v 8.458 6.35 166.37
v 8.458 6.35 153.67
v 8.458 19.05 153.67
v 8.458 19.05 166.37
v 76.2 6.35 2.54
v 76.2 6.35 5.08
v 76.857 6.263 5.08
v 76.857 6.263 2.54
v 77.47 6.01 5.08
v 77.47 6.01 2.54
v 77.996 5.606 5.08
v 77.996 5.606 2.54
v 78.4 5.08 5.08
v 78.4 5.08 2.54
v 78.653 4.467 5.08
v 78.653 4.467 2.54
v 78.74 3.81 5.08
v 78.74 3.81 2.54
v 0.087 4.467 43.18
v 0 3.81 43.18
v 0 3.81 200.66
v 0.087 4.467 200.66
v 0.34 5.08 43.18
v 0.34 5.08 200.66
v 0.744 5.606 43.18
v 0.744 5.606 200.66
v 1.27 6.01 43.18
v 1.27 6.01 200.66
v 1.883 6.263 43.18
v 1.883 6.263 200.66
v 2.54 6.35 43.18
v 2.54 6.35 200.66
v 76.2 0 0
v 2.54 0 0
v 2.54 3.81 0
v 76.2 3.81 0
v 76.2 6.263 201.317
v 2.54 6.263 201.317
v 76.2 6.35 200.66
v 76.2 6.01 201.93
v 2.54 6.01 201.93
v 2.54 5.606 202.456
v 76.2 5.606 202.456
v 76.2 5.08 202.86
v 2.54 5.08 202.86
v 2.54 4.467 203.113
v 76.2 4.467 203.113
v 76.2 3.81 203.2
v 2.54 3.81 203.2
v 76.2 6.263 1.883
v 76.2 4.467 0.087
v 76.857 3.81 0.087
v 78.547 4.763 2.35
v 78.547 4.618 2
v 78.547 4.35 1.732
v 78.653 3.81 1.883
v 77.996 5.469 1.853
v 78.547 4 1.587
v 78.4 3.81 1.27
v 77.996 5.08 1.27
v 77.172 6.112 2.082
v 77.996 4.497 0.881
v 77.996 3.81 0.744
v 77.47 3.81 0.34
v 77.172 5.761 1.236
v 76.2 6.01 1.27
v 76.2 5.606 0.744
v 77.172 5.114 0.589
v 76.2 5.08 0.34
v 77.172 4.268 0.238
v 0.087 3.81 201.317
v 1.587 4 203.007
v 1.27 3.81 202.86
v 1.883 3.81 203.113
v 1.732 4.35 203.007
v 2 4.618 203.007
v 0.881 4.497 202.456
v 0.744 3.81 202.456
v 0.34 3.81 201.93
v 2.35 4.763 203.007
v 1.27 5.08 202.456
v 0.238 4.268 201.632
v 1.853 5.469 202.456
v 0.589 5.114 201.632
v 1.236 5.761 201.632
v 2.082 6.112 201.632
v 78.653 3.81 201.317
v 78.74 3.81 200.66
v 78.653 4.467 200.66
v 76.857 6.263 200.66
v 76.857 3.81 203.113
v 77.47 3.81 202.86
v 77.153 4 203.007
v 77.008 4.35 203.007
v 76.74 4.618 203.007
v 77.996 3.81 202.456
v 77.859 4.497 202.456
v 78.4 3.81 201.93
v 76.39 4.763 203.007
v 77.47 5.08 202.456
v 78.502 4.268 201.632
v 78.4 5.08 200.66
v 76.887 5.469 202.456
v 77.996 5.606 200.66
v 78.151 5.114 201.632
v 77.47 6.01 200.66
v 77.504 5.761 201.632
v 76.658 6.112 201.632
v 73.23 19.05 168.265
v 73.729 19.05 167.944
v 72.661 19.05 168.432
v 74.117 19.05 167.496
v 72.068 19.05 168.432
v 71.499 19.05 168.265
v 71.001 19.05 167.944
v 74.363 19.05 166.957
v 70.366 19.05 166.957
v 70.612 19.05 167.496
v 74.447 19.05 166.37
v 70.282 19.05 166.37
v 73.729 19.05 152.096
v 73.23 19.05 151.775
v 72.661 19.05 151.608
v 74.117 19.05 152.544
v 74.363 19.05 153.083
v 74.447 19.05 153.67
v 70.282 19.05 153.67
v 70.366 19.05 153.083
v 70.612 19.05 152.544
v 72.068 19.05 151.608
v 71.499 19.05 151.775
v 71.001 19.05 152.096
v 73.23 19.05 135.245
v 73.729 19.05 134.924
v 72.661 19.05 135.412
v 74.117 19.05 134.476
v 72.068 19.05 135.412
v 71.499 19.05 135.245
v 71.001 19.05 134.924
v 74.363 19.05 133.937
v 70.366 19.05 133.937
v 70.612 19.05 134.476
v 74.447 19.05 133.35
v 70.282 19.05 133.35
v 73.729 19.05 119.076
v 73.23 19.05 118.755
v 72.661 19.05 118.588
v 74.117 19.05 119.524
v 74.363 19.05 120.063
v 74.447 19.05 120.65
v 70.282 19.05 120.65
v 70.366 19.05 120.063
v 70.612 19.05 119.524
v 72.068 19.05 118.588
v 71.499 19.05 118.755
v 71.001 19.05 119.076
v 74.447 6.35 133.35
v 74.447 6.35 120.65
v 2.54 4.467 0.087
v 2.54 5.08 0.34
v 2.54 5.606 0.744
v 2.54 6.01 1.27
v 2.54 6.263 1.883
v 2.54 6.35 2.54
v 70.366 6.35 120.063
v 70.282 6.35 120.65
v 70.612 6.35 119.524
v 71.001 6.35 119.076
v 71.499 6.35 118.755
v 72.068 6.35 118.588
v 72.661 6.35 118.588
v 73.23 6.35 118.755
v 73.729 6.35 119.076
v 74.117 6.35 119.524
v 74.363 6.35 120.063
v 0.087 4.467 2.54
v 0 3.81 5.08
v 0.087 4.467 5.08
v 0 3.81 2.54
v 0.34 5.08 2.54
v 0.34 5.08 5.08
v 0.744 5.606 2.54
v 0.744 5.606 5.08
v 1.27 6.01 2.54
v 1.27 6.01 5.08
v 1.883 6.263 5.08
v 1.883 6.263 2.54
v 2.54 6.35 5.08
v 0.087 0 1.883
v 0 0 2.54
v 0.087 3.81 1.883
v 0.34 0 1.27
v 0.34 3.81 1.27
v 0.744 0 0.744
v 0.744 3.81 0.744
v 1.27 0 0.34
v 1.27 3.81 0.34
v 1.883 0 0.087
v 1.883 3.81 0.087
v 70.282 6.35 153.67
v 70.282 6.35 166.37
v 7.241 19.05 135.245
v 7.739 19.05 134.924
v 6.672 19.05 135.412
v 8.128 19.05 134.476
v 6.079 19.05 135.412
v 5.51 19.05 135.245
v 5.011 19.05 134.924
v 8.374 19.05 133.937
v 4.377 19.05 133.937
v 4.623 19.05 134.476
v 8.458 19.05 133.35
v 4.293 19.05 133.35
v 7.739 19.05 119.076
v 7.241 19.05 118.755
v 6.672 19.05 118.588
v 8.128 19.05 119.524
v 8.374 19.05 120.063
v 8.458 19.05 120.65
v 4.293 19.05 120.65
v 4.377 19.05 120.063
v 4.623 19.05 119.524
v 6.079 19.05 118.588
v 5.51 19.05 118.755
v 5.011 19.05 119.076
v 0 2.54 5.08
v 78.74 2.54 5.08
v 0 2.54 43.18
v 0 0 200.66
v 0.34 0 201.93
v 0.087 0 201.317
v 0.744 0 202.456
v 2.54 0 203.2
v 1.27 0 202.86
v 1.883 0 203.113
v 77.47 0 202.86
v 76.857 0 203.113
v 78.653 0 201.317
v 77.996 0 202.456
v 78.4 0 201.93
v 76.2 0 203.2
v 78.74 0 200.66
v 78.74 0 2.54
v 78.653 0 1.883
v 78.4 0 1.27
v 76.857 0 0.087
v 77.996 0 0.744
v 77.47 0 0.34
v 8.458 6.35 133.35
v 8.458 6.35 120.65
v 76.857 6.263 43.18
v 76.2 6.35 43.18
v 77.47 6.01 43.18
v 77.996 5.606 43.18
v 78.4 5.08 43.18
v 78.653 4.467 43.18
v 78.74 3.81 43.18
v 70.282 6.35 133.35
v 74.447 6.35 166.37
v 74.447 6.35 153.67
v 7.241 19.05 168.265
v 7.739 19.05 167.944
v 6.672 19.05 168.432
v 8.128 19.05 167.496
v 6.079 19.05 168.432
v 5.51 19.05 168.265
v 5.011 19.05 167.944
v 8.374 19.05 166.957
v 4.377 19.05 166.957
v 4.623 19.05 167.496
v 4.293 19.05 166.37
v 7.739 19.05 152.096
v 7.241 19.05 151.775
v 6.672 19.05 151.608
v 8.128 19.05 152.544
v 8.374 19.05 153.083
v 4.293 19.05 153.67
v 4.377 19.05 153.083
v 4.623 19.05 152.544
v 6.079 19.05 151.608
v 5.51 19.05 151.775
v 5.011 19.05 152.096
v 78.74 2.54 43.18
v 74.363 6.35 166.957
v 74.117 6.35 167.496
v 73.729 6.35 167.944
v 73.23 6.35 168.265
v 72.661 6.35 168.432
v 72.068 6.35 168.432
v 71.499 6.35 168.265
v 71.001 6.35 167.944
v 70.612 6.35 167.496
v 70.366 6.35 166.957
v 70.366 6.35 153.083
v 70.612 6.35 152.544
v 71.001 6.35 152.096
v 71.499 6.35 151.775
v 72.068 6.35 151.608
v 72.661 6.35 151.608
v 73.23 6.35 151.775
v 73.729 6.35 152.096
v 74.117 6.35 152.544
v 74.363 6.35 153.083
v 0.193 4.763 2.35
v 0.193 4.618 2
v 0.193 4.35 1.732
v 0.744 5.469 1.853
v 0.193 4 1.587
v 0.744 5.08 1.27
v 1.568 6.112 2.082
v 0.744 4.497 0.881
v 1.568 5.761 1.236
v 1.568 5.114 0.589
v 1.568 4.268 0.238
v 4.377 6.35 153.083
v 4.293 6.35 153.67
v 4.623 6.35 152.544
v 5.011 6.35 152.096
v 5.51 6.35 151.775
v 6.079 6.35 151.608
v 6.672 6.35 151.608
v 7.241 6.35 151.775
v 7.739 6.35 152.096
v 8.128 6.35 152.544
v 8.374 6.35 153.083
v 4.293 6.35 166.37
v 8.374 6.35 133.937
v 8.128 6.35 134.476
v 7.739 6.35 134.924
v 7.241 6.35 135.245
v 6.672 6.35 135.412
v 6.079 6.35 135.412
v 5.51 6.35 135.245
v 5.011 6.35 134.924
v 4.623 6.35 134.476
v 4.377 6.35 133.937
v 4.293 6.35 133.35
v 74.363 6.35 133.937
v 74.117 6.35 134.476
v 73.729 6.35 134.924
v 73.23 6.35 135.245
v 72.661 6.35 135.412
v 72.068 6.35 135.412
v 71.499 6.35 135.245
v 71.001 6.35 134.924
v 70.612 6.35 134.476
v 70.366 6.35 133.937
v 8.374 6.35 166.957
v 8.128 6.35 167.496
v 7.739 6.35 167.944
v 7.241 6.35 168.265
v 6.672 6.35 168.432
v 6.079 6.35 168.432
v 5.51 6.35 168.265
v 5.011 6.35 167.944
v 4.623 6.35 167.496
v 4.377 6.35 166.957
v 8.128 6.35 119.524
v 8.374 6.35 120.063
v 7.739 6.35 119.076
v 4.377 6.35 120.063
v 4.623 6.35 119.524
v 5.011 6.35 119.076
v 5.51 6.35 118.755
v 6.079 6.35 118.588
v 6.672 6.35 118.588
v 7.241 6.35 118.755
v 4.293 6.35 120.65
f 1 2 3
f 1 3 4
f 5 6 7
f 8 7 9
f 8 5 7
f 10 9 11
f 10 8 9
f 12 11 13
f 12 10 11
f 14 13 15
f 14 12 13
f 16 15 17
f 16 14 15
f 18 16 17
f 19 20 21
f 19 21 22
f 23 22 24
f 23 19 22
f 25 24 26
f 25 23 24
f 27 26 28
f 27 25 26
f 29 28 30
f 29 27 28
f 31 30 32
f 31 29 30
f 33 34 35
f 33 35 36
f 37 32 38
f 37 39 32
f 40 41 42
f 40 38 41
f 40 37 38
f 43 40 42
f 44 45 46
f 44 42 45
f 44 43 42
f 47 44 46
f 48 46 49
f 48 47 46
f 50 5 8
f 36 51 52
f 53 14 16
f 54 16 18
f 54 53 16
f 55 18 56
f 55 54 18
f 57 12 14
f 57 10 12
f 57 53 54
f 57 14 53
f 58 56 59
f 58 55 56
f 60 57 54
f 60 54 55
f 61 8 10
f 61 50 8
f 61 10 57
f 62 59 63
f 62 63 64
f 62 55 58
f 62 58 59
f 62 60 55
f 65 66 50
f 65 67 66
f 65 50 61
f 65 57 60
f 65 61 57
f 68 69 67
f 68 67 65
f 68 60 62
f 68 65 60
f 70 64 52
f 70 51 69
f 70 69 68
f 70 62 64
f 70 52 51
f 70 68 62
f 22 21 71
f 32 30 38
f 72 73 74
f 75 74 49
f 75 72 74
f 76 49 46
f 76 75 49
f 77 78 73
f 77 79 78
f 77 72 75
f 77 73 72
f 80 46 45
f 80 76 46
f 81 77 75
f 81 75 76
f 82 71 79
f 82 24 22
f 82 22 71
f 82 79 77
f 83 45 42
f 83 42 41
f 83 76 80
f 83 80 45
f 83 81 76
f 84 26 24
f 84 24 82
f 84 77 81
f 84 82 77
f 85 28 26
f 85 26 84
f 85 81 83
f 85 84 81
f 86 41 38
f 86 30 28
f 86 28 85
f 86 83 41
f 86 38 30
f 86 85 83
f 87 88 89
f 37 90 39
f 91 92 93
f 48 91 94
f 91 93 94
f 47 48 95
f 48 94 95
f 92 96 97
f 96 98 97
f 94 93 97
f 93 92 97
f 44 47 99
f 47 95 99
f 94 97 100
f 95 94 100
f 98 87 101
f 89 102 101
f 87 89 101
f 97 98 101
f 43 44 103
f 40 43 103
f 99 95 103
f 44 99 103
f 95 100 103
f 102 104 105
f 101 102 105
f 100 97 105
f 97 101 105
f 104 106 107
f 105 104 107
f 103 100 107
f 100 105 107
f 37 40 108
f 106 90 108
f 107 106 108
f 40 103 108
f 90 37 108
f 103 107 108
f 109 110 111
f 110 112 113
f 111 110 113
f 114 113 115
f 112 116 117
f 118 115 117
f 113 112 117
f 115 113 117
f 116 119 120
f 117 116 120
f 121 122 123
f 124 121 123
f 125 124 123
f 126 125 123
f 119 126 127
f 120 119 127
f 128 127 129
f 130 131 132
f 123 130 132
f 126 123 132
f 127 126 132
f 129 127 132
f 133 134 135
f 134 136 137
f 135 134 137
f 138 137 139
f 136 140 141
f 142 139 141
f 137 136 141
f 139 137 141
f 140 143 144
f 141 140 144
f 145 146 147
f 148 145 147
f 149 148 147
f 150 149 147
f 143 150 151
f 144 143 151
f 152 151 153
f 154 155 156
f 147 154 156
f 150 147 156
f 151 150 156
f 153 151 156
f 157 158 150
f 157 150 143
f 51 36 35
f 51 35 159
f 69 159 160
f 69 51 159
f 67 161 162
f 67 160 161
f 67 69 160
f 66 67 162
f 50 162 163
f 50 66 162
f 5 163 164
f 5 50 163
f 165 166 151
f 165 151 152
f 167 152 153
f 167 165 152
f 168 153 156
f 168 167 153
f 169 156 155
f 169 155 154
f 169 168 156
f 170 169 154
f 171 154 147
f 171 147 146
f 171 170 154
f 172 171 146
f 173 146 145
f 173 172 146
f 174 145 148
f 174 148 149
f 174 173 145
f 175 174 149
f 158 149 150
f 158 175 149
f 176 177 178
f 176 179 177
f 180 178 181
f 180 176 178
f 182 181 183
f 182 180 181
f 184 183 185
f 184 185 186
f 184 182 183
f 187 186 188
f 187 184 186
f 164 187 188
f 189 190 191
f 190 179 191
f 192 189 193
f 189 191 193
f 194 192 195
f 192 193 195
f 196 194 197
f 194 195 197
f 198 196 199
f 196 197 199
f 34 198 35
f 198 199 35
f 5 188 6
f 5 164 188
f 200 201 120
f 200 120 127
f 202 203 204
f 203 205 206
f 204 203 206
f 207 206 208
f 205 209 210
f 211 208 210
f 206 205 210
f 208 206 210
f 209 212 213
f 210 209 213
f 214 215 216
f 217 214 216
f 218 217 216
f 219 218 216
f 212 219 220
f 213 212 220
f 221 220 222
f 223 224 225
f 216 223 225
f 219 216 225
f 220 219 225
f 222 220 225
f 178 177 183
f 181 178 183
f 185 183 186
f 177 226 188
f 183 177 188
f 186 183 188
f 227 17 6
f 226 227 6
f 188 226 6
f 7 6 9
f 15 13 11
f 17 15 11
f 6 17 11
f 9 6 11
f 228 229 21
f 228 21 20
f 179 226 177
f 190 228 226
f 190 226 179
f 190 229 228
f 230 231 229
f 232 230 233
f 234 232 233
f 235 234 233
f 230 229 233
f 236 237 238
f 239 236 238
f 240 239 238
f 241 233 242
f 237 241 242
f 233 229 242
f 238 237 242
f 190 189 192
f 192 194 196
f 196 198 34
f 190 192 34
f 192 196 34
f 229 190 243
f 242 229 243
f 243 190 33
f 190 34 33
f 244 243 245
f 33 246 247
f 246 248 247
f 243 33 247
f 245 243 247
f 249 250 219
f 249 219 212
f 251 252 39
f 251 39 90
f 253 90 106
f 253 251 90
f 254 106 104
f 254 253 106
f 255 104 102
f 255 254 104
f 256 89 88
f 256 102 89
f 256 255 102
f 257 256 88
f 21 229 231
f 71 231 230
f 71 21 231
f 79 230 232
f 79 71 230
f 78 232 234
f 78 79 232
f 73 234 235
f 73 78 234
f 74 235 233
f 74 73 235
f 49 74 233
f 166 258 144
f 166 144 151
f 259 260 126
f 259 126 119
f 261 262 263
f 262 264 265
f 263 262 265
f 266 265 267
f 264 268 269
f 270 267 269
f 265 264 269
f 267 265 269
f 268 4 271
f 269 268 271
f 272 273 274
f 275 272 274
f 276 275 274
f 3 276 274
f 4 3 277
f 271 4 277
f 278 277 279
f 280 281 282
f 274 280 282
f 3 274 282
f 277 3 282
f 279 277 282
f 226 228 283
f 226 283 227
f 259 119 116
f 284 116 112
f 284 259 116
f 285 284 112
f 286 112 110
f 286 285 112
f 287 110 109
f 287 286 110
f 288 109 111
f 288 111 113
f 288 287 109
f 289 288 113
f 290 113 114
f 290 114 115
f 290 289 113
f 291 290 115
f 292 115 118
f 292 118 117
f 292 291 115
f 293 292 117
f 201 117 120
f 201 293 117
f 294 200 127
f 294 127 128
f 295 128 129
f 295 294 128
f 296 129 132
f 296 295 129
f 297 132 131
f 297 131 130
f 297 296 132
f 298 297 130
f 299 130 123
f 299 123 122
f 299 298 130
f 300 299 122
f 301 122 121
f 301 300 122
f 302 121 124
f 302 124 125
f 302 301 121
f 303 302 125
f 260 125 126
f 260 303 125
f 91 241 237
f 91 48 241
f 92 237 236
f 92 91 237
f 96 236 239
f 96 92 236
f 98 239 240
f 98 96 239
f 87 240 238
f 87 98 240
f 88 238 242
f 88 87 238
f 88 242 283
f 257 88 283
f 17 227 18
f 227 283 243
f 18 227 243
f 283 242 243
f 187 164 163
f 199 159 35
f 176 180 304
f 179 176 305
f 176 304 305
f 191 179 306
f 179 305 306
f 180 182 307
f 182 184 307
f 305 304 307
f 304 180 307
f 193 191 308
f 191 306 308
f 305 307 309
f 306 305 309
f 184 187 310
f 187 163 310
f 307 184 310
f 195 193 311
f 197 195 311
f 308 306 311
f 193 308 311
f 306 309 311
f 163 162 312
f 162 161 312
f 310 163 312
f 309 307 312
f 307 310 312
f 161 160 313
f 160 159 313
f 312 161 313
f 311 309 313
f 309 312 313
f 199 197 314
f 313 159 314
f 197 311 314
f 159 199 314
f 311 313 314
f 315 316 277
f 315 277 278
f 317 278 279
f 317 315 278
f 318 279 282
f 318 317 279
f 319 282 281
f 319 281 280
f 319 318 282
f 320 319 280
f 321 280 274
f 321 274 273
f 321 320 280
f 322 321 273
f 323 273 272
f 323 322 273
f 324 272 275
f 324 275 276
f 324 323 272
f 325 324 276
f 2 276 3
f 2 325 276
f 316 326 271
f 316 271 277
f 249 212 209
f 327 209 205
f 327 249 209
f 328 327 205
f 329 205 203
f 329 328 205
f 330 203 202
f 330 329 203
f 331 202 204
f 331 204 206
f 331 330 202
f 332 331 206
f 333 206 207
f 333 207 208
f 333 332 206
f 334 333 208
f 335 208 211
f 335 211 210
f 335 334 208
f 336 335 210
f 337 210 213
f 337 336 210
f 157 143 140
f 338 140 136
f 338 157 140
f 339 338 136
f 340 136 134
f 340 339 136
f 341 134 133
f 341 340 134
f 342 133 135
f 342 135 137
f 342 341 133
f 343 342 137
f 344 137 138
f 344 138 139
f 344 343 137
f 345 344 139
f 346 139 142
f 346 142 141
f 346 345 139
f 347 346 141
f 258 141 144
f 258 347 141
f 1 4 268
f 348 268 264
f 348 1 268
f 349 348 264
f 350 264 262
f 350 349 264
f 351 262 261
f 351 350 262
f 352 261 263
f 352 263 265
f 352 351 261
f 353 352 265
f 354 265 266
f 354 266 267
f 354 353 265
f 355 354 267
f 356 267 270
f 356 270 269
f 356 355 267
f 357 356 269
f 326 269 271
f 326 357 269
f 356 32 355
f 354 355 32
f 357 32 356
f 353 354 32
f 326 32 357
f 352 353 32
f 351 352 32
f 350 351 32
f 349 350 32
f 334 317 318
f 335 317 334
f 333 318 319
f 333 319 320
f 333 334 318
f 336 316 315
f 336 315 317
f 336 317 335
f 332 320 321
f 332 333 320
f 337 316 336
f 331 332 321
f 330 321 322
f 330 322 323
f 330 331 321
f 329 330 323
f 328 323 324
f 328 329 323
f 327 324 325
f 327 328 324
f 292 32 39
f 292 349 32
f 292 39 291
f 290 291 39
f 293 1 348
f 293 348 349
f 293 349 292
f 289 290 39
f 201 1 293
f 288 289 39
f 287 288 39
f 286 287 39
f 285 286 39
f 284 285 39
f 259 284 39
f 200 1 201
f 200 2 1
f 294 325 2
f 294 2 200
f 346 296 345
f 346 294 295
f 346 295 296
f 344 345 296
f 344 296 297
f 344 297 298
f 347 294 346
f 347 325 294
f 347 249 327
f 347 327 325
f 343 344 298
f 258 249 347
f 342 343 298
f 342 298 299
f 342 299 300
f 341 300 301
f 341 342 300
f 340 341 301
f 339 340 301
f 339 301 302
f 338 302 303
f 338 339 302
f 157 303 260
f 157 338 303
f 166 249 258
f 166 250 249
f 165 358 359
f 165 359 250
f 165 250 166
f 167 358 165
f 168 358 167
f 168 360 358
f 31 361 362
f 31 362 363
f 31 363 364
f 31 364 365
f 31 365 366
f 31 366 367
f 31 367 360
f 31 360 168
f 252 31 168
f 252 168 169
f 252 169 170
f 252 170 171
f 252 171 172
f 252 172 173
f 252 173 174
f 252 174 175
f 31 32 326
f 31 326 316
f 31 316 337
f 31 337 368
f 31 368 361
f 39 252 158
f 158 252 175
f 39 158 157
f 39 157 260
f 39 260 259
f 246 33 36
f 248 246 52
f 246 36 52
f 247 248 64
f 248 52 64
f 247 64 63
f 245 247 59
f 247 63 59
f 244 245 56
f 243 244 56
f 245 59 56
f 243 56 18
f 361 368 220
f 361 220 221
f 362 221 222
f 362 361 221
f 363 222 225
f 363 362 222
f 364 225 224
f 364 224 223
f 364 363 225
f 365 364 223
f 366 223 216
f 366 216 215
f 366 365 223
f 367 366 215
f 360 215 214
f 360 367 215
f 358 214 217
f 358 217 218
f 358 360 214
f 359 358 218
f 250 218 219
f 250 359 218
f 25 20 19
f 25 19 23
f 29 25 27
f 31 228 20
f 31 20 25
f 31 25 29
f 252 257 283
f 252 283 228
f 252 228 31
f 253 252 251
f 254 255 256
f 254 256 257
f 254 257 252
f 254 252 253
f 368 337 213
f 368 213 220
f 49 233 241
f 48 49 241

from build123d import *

# Parameters (mm, degrees)
SKETCH1_W            = 78.74
SKETCH1_H            = 203.2
BOSS_EXTRUDE1_DEPTH  = 6.35
BOSS_EXTRUDE2_DEPTH  = 12.7
LPATTERN2_COUNT      = 2
LPATTERN2_PITCH      = 65.9892
LPATTERN2_COUNT_DIR2 = 2
LPATTERN2_PITCH_DIR2 = 33.02
SKETCH3_W            = 38.1
SKETCH3_H            = 3.81
CUT_EXTRUDE1_DEPTH   = 219.753583056
FILLET1_R            = 2.54


with BuildPart() as part:
    # Sketch1 → Boss-Extrude1 (new body)
    with BuildSketch(Plane(origin=(0, 0, 0), x_dir=(1, 0, 0), z_dir=(0, 1, 0))):
        with Locations((39.37, -101.6)):
            Rectangle(SKETCH1_W, SKETCH1_H)
    extrude(amount=BOSS_EXTRUDE1_DEPTH)

    # Sketch2 → Boss-Extrude2 (add)
    with BuildSketch(Plane(origin=(0, 6.35, 0), x_dir=(1, 0, 0), z_dir=(0, 1, 0))):
        with BuildLine():
            Line((4.2926, -133.35), (4.2926, -120.65))
            ThreePointArc((4.2926, -120.65), (6.3754, -118.5672), (8.4582, -120.65))
            Line((8.4582, -120.65), (8.4582, -133.35))
            ThreePointArc((8.4582, -133.35), (6.3754, -135.4328), (4.2926, -133.35))
        make_face()
    boss_extrude2 = extrude(amount=BOSS_EXTRUDE2_DEPTH)

    # LPattern2: Boss-Extrude2 2 × 2
    with Locations(*[(i * LPATTERN2_PITCH, 0, j * LPATTERN2_PITCH_DIR2) for i in range(LPATTERN2_COUNT) for j in range(LPATTERN2_COUNT_DIR2) if (i, j) != (0, 0)]):
        add(boss_extrude2)

    # Sketch3 → Cut-Extrude1 (cut, through all)
    with BuildSketch(Plane(origin=(78.74, 0, 0), x_dir=(0, 0, -1), z_dir=(1, 0, 0))):
        with Locations((-24.13, 4.445)):
            Rectangle(SKETCH3_W, SKETCH3_H)
    extrude(amount=-CUT_EXTRUDE1_DEPTH, mode=Mode.SUBTRACT)

    # Fillet1
    fillet1_edges = [part.edges().sort_by_distance(p)[0] for p in [
        (78.74, 6.35, 123.19),
        (39.37, 6.35, 0),
        (0, 6.35, 2.54),
        (78.74, 6.35, 2.54),
        (0, 6.35, 123.19),
        (0, 3.175, 0),
        (78.74, 3.175, 0),
        (78.74, 3.175, 203.2),
        (0, 3.175, 203.2),
        (39.37, 6.35, 203.2),
    ]]
    fillet(fillet1_edges, radius=FILLET1_R)


solid = part.part
